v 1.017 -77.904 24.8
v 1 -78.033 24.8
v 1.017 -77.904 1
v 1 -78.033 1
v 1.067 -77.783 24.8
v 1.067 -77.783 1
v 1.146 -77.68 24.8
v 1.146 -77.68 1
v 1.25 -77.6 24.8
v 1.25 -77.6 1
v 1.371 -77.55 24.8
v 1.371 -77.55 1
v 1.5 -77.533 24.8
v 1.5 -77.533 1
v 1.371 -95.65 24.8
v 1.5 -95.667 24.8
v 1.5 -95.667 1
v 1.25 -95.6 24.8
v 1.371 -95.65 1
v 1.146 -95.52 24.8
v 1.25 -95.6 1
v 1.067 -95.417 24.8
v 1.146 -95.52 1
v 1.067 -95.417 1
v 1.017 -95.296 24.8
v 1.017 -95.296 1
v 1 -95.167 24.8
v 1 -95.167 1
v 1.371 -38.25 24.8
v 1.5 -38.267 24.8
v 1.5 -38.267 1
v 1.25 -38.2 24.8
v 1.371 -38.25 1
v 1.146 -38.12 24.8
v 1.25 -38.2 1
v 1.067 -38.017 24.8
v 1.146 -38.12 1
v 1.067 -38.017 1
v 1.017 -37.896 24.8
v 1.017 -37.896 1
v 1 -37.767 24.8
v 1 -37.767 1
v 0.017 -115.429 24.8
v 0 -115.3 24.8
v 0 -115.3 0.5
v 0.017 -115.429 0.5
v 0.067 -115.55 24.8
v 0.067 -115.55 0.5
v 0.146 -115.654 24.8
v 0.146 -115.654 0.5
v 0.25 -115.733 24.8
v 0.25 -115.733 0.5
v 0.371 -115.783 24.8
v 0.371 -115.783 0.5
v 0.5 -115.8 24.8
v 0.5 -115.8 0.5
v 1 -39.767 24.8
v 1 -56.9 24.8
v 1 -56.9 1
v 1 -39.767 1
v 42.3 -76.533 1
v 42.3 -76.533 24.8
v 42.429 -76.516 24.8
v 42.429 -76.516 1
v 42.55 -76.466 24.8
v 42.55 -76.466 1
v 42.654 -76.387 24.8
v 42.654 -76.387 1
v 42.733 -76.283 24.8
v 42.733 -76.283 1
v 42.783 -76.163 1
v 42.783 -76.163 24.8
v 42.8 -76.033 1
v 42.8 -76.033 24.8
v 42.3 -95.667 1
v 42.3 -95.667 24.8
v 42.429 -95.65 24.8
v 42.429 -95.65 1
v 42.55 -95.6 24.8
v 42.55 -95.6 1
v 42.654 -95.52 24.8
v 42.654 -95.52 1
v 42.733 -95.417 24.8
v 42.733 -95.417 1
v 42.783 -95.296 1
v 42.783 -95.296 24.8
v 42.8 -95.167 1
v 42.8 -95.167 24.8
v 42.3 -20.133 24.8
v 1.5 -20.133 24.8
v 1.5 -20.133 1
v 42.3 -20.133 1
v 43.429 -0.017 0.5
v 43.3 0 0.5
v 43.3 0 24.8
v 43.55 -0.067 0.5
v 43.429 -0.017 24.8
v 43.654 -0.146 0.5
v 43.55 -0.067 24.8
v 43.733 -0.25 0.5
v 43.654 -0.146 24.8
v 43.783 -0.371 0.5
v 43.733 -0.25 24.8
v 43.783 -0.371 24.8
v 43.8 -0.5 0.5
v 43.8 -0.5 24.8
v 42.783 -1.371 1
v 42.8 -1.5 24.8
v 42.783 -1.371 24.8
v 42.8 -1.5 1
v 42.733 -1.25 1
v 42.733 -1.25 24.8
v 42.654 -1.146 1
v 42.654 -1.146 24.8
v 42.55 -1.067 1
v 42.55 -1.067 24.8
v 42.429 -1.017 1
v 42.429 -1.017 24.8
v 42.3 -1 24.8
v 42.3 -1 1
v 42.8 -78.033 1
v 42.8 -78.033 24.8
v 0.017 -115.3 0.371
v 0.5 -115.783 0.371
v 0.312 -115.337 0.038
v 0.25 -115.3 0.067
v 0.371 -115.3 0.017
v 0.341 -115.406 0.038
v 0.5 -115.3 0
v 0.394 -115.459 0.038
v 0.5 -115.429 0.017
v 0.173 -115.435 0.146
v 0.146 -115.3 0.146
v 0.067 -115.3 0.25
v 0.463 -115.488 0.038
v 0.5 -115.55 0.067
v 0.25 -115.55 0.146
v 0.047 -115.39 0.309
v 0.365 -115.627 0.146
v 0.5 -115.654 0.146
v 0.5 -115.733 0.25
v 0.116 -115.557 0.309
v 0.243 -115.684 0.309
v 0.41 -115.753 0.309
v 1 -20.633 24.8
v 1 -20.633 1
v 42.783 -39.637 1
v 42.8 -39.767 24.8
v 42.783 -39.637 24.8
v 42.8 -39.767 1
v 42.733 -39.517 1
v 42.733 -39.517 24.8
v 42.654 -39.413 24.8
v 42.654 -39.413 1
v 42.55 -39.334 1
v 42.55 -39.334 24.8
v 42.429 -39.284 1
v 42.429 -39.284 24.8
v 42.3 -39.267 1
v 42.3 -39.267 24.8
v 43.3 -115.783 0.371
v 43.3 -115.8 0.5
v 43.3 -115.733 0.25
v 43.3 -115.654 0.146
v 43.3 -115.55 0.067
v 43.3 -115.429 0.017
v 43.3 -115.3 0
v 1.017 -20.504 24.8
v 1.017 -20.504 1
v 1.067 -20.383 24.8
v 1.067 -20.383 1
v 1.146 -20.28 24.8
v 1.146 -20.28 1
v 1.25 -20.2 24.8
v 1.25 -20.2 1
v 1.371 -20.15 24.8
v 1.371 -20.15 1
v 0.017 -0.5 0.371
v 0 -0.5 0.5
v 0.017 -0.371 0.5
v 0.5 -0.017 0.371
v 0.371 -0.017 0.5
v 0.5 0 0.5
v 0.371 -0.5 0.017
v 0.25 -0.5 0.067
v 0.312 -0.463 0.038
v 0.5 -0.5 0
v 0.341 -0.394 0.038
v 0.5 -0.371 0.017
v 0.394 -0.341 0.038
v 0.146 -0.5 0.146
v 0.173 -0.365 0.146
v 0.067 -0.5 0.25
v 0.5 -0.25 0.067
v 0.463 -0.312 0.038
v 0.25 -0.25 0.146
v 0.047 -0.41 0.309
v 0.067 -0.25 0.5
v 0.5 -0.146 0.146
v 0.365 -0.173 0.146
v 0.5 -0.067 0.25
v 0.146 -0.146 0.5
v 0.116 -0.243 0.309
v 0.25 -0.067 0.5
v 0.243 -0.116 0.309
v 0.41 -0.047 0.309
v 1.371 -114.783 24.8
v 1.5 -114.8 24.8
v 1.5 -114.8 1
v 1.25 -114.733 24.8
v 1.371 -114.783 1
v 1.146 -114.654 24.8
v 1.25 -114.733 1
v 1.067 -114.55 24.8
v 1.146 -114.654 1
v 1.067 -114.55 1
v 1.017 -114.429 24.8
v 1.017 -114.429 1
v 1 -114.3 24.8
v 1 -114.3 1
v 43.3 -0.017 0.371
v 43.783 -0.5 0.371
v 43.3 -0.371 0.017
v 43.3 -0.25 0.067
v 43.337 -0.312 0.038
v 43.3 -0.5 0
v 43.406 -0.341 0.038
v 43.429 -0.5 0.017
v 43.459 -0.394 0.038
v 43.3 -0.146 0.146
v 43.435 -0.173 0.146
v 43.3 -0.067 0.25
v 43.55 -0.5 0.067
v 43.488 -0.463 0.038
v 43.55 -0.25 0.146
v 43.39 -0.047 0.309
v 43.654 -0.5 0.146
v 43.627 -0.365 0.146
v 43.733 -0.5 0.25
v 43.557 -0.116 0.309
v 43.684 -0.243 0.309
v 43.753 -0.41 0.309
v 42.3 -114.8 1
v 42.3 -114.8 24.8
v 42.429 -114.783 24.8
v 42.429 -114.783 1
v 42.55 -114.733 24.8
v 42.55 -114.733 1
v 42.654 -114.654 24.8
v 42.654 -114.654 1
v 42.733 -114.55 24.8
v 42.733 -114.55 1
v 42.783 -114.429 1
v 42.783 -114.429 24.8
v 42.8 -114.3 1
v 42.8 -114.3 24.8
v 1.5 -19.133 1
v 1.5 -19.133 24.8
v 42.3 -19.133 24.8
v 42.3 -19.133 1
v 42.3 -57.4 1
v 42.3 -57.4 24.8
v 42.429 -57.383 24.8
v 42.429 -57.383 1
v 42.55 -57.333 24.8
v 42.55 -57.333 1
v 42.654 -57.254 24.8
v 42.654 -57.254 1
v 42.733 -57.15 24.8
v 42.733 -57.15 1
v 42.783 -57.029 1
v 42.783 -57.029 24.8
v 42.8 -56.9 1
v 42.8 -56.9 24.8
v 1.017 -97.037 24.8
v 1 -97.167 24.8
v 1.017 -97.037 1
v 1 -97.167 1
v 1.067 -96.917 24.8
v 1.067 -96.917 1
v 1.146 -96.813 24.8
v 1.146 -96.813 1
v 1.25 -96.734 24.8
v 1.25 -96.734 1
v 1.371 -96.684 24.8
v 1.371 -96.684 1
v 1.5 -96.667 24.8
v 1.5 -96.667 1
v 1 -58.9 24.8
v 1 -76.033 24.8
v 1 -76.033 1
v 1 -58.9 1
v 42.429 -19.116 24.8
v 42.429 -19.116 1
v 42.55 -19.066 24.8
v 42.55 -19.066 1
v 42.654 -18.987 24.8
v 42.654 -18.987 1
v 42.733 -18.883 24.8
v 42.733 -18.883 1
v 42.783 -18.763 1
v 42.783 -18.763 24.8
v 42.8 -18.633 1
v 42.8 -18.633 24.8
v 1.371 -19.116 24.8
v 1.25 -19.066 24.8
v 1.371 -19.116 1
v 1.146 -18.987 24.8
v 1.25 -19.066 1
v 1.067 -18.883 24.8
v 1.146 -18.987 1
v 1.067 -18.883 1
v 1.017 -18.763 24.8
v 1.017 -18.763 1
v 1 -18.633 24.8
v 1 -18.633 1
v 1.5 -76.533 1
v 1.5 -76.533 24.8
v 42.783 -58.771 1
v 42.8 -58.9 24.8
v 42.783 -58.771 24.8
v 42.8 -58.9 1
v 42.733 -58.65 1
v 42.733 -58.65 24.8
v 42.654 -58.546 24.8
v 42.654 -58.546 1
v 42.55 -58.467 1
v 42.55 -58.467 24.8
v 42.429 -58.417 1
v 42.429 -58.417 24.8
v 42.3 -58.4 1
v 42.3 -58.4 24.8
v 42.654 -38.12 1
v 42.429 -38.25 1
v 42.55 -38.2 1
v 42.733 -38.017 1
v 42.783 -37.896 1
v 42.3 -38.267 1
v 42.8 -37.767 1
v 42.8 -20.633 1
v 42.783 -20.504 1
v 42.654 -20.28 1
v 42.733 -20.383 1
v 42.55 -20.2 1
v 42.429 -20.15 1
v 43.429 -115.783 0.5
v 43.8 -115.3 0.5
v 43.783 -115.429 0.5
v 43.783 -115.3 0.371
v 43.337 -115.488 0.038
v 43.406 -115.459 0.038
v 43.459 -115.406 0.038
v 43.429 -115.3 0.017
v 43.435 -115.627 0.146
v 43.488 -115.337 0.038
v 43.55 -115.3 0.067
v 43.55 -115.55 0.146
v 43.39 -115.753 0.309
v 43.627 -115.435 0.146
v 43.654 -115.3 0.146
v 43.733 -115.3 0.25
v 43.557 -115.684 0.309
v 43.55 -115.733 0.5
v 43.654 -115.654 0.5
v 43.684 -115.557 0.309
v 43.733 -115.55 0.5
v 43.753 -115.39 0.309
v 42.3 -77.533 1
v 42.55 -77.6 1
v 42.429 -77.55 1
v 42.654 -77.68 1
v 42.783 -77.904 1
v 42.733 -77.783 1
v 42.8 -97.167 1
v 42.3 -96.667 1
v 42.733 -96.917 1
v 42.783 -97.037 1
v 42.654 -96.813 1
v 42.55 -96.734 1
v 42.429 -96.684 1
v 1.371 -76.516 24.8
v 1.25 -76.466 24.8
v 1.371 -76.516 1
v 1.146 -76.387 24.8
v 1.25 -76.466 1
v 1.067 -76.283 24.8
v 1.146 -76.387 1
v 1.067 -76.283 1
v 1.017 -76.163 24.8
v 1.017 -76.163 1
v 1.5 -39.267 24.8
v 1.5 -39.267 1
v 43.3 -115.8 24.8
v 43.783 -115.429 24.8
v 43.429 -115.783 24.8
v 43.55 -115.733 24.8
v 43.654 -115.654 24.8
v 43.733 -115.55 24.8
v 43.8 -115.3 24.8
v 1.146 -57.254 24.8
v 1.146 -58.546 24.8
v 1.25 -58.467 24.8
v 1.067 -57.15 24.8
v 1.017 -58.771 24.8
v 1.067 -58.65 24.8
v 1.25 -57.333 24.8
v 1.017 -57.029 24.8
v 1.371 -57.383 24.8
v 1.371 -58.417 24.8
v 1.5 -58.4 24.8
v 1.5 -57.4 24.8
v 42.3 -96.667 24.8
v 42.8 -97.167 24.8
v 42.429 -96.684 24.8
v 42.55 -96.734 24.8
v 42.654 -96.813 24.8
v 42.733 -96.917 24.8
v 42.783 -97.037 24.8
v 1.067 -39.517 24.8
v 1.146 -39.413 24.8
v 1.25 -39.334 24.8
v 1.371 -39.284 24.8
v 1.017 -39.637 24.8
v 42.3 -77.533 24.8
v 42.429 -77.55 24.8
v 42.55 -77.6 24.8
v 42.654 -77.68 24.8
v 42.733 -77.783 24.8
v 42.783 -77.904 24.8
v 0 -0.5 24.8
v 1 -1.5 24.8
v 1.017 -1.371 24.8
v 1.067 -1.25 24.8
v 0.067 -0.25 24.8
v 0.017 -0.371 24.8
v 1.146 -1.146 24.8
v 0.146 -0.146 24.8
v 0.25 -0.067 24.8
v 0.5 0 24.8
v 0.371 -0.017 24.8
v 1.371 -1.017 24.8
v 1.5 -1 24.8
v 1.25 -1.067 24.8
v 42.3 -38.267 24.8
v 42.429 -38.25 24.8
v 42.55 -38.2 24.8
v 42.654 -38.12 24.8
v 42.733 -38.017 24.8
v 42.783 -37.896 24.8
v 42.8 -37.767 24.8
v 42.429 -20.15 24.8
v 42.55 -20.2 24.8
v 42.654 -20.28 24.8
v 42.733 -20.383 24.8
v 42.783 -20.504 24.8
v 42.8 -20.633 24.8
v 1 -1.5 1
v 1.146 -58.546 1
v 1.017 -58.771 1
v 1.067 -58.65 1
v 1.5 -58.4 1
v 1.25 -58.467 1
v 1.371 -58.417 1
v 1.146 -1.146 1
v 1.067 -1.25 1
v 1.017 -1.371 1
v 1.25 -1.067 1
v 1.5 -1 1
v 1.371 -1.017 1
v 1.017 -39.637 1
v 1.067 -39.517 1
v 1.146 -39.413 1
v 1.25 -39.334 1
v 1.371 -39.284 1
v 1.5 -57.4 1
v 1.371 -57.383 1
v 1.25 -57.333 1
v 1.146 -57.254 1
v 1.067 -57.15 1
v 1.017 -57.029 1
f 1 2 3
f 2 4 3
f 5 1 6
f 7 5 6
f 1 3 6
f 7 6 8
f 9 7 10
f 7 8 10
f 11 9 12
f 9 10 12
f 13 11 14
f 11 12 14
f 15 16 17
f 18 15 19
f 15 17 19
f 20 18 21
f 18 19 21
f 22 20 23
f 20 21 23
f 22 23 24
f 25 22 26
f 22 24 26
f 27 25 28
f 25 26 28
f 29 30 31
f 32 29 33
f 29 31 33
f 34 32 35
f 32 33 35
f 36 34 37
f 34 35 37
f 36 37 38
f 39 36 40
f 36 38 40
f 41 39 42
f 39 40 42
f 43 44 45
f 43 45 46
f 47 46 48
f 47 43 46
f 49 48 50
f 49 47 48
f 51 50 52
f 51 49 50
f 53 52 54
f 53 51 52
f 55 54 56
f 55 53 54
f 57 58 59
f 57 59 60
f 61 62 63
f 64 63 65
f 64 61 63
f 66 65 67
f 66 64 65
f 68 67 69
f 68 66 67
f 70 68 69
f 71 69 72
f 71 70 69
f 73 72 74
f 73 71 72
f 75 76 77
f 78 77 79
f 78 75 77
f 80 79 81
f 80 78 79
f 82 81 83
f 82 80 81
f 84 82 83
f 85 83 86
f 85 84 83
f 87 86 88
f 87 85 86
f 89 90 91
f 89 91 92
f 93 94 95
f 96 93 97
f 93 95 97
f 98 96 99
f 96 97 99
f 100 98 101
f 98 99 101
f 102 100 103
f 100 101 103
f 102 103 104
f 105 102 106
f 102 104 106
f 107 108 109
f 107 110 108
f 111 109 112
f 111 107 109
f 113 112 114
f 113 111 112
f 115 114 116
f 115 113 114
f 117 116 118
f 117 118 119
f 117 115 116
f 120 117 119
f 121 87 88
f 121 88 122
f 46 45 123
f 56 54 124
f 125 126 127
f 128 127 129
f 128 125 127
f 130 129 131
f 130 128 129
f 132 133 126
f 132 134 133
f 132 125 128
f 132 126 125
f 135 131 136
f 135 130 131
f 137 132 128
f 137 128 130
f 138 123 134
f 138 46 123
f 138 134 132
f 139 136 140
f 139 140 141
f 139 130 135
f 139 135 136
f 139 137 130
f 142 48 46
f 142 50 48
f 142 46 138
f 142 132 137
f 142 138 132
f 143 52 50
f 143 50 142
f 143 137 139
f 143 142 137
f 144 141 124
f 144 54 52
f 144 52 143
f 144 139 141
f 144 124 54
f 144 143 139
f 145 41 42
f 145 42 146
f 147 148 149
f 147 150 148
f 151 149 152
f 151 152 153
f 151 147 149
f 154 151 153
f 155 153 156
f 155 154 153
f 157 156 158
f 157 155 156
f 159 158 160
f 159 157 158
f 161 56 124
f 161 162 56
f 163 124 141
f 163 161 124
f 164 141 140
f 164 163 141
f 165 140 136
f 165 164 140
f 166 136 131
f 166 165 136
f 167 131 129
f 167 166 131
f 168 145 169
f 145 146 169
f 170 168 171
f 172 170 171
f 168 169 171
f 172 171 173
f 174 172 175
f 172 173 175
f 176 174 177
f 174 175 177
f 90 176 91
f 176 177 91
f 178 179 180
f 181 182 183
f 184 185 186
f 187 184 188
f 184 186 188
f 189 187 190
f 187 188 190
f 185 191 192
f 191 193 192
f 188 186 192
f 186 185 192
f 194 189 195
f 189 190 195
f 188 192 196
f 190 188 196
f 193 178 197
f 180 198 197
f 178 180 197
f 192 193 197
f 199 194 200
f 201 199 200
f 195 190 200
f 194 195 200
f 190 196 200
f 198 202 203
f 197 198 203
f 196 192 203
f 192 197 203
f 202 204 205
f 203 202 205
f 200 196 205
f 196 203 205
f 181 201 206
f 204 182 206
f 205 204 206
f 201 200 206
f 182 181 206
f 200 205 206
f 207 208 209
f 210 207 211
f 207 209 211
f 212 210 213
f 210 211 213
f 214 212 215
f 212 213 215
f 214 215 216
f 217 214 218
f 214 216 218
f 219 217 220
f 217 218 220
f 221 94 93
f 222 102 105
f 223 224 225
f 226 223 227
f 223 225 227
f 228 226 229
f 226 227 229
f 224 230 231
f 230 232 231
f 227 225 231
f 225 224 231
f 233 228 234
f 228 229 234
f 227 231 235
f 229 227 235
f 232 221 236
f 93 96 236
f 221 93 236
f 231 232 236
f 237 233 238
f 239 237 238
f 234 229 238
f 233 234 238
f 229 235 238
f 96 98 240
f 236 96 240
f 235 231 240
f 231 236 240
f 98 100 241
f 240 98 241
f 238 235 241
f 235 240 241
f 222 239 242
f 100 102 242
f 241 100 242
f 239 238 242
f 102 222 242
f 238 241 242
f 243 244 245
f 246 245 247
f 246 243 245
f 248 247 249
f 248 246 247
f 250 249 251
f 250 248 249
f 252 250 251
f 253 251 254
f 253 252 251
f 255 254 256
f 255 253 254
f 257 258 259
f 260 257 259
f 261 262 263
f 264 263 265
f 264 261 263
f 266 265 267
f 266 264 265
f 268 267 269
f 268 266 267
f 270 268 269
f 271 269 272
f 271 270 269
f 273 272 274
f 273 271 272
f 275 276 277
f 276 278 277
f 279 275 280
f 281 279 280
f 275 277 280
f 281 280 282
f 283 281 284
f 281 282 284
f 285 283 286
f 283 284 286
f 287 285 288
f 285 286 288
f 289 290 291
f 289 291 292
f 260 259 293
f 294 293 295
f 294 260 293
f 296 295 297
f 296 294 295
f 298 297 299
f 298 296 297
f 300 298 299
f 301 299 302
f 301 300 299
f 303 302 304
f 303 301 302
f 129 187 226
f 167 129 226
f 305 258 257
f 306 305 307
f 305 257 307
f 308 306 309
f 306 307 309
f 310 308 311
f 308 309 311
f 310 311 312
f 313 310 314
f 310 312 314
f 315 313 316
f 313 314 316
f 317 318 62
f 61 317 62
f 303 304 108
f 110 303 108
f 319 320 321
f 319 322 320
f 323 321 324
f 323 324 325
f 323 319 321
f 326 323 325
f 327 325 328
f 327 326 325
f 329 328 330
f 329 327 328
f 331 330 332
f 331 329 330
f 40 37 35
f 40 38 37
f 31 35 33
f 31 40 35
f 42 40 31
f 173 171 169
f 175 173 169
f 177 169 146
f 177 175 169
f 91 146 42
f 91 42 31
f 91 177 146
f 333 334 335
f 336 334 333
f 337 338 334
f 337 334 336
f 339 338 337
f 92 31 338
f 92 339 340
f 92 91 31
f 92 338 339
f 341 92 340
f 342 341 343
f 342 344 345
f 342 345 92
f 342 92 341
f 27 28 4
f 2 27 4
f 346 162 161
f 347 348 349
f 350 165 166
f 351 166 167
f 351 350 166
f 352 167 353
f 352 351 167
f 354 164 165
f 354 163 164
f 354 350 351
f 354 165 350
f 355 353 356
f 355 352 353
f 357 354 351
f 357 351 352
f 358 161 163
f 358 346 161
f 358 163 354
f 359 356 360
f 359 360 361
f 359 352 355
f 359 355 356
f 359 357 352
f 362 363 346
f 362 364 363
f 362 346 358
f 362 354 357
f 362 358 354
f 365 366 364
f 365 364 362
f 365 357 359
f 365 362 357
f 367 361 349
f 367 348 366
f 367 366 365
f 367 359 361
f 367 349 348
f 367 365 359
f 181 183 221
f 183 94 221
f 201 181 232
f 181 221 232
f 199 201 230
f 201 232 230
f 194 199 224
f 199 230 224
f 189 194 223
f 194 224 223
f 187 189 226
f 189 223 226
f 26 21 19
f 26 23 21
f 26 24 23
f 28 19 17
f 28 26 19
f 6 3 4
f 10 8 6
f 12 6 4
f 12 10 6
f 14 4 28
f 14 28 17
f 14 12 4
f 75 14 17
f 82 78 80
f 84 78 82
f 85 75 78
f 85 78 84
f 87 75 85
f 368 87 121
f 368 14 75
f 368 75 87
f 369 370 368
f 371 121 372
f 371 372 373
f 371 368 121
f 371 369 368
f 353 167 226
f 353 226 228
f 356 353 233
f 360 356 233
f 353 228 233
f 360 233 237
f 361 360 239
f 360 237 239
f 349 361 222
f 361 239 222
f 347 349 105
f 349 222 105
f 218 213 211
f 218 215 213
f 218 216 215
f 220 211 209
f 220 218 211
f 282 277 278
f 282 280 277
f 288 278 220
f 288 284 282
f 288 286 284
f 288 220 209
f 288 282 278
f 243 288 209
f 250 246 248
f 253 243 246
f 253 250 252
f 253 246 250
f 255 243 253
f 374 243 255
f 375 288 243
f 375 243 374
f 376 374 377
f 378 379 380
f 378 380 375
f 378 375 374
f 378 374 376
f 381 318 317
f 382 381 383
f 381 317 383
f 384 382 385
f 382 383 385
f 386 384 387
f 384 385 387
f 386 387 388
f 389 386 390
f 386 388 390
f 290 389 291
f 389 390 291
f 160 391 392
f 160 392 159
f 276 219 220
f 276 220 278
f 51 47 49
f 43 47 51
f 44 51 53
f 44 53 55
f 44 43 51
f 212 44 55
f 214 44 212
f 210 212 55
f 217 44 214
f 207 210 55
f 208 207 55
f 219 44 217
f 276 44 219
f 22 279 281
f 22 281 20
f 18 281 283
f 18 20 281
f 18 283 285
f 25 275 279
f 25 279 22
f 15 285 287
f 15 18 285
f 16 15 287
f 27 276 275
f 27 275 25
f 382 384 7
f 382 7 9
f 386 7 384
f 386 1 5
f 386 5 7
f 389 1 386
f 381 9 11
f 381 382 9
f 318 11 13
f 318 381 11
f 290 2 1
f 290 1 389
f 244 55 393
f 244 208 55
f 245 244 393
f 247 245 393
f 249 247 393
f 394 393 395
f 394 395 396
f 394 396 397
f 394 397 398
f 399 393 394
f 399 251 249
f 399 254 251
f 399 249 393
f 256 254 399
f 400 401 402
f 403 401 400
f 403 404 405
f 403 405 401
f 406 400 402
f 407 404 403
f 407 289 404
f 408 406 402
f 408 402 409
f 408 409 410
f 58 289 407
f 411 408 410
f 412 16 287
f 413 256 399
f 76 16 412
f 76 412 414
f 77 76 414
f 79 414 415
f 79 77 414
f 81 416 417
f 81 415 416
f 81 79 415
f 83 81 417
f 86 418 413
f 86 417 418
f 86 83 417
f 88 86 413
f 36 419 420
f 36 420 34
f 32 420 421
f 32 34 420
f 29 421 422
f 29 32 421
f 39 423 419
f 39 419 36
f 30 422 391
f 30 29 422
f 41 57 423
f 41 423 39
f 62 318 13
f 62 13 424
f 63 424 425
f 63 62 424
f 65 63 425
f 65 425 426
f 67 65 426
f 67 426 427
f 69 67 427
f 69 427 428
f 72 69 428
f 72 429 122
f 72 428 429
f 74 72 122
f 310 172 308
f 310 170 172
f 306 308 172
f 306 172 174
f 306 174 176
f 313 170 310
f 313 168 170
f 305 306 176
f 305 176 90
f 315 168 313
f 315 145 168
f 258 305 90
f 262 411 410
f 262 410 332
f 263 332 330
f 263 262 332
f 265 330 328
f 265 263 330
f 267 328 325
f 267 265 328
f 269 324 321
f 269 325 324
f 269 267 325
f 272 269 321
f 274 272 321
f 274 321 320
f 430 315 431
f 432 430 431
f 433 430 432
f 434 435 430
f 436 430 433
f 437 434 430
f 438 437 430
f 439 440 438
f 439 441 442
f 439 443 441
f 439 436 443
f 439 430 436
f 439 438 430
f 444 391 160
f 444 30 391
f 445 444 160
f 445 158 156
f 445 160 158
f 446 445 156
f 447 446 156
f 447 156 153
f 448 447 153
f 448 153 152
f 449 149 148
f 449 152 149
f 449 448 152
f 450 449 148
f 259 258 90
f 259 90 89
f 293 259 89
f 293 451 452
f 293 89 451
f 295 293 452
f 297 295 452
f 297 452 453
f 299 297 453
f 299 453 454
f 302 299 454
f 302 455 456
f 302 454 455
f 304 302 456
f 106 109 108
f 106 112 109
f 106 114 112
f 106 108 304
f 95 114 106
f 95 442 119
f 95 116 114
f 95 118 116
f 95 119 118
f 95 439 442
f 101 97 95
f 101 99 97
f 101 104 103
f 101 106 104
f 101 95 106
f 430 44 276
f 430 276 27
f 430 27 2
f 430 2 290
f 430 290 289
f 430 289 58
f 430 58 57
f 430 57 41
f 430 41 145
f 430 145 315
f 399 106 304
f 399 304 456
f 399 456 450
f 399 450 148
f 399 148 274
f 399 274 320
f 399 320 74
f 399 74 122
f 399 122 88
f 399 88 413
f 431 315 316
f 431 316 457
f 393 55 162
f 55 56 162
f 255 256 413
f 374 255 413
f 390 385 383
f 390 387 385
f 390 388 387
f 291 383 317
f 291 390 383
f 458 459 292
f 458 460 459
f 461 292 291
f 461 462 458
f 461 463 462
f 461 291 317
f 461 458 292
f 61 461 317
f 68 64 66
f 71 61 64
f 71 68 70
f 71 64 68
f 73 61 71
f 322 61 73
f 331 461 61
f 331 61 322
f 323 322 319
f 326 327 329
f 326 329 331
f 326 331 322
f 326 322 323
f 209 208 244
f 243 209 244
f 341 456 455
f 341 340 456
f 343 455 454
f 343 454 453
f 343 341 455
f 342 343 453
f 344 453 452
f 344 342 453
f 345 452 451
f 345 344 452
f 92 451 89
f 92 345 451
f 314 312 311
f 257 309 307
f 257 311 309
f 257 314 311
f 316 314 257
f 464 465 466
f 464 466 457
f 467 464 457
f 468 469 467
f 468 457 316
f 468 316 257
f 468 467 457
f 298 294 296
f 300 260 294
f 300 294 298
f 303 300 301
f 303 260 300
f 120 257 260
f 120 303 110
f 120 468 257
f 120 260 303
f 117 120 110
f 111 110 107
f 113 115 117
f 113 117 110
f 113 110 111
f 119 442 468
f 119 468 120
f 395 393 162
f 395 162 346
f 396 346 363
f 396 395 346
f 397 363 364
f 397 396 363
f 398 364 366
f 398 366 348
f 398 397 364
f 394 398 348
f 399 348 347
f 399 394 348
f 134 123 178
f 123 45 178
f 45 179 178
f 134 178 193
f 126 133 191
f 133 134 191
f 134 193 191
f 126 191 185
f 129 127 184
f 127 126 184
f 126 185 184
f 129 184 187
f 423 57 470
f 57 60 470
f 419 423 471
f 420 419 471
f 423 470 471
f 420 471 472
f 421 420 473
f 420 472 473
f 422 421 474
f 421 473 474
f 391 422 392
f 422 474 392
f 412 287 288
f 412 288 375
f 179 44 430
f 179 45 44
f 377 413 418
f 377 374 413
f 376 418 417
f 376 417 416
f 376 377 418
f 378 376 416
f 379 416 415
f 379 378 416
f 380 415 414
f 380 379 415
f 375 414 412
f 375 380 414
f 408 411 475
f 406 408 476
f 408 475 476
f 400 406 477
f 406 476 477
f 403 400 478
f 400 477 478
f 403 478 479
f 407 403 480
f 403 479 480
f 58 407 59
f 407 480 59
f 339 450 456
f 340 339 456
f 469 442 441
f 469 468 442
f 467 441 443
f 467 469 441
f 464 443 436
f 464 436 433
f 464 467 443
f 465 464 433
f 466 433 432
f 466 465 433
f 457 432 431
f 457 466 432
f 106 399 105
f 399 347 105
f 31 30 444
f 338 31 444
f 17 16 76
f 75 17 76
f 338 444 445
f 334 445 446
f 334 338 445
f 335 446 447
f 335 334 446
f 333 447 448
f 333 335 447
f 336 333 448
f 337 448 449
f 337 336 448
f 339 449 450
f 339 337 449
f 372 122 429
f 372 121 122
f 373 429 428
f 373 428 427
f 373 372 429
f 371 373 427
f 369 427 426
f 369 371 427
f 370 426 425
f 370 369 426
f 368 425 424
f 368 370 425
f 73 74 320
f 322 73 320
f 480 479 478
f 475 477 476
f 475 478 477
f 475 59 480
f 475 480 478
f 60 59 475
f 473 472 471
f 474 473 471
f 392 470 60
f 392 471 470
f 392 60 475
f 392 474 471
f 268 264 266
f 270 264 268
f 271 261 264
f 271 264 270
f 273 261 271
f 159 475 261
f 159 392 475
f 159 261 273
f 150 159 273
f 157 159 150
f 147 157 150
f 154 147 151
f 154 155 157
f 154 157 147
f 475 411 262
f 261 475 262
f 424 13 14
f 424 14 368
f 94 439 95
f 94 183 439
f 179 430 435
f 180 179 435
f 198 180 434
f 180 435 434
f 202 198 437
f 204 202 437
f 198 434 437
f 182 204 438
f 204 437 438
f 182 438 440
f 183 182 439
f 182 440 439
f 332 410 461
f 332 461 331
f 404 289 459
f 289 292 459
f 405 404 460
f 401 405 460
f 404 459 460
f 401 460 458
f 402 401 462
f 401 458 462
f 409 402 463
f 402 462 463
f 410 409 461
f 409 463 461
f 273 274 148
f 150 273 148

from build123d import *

# Parameters (mm, degrees)
F0_W     = 43.8
F0_H     = 115.8
F1_DEPTH = 24.8
F2_W     = 41.8
F2_H     = 18.133333
F2_H_2   = 18.133334
F3_DEPTH = 23.8
F4_R     = 0.5
F5_R     = 0.5
F6_R     = 0.5


with BuildPart() as f1:
    # F0 (on Top) → F1 (new body)
    with BuildSketch(Plane.XY):
        with Locations((21.9, -57.9)):
            Rectangle(F0_W, F0_H)
    extrude(amount=F1_DEPTH)

    # F2 (on face) → F3 (cut)
    with BuildSketch(Plane.XY.offset(24.8)):
        with Locations((21.9, -10.066667)):
            Rectangle(F2_W, F2_H)
        with Locations((21.9, -29.2)):
            Rectangle(F2_W, F2_H_2)
        with Locations((21.9, -48.333333)):
            Rectangle(F2_W, F2_H)
        with Locations((21.9, -67.466667)):
            Rectangle(F2_W, F2_H)
        with Locations((21.9, -86.6)):
            Rectangle(F2_W, F2_H_2)
        with Locations((21.9, -105.733333)):
            Rectangle(F2_W, F2_H)
    extrude(amount=-F3_DEPTH, mode=Mode.SUBTRACT)

    # F4
    f4_edges = [f1.edges().sort_by_distance(p)[0] for p in [
        (43.8, 0, 12.4),
        (43.8, -115.8, 12.4),
        (0, -115.8, 12.4),
        (0, 0, 12.4),
        (0, -57.9, 0),
        (21.9, -115.8, 0),
        (21.9, 0, 0),
        (43.8, -57.9, 0),
    ]]
    fillet(f4_edges, radius=F4_R)

    # F5
    f5_edges = [f1.edges().sort_by_distance(p)[0] for p in [
        (1, -1, 12.9),
        (42.8, -1, 12.9),
        (42.8, -20.133333, 12.9),
        (42.8, -39.266667, 12.9),
        (42.8, -58.4, 12.9),
        (42.8, -77.533333, 12.9),
        (42.8, -96.666667, 12.9),
        (42.8, -114.8, 12.9),
        (1, -114.8, 12.9),
        (1, -95.666667, 12.9),
        (1, -76.533333, 12.9),
        (1, -57.4, 12.9),
        (1, -38.266667, 12.9),
        (1, -19.133333, 12.9),
    ]]
    fillet(f5_edges, radius=F5_R)

    # F6
    f6_edges = [f1.edges().sort_by_distance(p)[0] for p in [
        (42.8, -19.133333, 12.9),
        (42.8, -38.266667, 12.9),
        (42.8, -57.4, 12.9),
        (1, -20.133333, 12.9),
        (1, -39.266667, 12.9),
        (1, -58.4, 12.9),
        (42.8, -76.533333, 12.9),
        (42.8, -95.666667, 12.9),
        (1, -77.533333, 12.9),
        (1, -96.666667, 12.9),
    ]]
    fillet(f6_edges, radius=F6_R)


solid = f1.part
